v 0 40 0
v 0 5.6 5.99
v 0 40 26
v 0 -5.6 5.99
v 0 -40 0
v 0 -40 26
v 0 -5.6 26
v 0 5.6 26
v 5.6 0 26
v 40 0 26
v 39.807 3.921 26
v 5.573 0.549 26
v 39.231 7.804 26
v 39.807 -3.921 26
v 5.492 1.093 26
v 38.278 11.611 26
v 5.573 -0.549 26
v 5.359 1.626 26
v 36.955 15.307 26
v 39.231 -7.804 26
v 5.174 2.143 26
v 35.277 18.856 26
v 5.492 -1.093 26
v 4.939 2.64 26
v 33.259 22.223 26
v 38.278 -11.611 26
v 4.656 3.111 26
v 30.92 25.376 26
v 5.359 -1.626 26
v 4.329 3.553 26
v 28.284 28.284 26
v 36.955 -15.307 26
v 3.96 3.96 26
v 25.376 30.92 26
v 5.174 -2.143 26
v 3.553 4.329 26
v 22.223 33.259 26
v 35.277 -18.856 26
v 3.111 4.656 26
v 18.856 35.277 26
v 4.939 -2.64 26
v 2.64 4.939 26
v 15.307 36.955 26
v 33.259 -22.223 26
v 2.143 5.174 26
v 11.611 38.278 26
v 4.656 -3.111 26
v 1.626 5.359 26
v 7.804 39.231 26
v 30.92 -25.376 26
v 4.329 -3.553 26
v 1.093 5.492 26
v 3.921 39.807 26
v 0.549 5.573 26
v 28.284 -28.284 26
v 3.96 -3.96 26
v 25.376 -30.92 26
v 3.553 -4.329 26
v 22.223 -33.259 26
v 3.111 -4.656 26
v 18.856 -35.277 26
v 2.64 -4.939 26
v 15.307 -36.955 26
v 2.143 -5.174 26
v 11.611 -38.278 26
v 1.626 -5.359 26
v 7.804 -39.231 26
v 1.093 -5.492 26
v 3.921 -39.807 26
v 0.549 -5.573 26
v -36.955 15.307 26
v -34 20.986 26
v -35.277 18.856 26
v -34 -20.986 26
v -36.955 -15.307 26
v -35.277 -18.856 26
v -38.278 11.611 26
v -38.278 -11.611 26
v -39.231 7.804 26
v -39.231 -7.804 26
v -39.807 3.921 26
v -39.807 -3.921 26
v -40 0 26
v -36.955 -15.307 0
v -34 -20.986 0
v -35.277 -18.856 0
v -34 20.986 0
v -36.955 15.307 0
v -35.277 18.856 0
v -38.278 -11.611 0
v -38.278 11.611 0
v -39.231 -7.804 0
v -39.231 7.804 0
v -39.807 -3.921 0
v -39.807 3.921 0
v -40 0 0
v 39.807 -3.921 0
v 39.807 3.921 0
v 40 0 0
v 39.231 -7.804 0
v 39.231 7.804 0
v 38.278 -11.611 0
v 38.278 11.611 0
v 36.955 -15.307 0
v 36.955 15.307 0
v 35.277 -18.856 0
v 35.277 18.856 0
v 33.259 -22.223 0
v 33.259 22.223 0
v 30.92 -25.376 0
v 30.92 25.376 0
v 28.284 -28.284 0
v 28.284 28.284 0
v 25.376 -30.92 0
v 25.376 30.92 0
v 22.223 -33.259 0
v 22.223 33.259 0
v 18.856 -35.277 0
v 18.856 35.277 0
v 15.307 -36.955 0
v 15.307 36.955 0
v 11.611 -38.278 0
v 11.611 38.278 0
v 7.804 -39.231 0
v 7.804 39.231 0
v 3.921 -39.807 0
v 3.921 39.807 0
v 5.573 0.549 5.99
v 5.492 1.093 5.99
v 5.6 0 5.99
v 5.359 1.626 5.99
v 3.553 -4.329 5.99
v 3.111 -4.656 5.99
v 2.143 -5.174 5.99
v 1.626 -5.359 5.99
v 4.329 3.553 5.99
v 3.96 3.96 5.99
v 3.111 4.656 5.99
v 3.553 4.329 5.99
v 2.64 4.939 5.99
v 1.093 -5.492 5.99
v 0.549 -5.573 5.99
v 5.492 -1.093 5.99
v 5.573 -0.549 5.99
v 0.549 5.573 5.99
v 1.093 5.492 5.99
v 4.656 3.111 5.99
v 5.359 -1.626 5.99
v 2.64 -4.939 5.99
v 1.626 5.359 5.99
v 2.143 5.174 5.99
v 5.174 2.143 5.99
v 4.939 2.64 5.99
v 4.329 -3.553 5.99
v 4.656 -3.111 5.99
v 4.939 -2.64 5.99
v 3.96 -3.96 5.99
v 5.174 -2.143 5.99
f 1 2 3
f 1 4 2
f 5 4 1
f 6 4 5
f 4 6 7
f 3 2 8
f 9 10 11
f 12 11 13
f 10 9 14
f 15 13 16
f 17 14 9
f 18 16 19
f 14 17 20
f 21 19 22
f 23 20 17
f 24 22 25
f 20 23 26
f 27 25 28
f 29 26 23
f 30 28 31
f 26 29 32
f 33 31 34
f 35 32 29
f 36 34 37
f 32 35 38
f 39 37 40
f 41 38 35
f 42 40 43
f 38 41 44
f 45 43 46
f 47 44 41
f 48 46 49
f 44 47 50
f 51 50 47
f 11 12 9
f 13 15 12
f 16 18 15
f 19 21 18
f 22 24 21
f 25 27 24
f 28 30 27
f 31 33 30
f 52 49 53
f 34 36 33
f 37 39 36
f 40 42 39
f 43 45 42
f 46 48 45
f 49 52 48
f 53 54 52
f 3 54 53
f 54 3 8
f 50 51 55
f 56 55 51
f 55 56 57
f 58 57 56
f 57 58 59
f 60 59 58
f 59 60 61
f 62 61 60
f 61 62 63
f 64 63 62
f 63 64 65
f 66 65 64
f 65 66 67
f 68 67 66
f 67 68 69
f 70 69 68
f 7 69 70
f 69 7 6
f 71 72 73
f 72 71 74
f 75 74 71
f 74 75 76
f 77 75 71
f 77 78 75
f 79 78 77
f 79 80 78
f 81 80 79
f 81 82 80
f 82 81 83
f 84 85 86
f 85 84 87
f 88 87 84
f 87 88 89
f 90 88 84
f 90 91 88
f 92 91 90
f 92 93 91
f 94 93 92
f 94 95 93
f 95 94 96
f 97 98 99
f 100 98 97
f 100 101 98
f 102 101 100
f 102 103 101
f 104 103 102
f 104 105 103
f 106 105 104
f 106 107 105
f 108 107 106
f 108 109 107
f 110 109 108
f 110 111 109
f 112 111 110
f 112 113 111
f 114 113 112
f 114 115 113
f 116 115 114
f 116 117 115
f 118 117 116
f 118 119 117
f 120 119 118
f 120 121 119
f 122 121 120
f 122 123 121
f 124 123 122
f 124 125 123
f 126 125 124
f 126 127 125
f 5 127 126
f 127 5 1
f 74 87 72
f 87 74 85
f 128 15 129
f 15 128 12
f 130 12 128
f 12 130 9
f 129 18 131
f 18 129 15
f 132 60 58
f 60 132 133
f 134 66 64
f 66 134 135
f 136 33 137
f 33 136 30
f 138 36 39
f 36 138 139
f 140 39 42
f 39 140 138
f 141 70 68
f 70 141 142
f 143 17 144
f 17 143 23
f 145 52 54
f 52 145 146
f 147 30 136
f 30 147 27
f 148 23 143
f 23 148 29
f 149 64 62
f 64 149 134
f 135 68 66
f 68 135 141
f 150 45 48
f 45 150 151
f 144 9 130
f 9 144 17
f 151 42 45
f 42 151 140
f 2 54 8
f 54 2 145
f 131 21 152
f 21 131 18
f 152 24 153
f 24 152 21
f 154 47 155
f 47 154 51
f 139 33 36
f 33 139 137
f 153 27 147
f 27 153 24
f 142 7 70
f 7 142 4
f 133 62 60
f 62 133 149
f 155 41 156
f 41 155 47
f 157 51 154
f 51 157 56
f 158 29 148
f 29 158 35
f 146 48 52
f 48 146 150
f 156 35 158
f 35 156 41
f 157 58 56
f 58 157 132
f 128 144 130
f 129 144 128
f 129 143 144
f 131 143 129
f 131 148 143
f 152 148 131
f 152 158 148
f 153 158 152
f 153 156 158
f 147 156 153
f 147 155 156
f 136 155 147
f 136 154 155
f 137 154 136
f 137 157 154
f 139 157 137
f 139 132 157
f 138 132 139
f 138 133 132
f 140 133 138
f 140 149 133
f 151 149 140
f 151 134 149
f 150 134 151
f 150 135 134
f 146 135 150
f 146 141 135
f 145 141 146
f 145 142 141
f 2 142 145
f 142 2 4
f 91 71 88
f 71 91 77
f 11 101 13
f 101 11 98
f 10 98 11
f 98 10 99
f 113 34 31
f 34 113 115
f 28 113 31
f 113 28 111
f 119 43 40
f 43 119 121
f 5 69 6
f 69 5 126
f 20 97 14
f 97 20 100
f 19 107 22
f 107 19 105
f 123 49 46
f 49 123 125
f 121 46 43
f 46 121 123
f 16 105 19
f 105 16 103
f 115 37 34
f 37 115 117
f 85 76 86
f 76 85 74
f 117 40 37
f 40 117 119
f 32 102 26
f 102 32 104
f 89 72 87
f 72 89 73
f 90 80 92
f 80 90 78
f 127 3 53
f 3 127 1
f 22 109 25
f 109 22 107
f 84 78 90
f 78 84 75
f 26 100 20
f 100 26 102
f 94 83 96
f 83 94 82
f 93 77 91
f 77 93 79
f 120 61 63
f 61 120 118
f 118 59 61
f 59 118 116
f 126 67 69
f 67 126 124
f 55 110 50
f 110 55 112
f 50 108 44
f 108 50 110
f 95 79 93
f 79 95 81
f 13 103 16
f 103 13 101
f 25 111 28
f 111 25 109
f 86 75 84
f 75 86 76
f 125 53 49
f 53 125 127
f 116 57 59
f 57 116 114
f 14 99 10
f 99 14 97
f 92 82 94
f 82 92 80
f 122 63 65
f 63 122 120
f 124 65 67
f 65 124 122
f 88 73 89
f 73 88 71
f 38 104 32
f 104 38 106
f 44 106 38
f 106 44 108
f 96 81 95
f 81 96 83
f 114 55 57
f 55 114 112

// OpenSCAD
// Built by bench/smallmodels/features/compiler.py from a list of features.
$fn = 64;
difference() {
  union() {
    translate([0, 0, 0]) cylinder(d = 80, h = 26);
  }
  union() {
    translate([-17, 0, 0]) rotate([0, 0, 0]) translate([-17, -40, 0]) cube([34, 80, 26]);
    translate([0, 0, 5.99]) rotate([0, 0, 0]) cylinder(d = 11.2, h = 20.02);
  }
}
